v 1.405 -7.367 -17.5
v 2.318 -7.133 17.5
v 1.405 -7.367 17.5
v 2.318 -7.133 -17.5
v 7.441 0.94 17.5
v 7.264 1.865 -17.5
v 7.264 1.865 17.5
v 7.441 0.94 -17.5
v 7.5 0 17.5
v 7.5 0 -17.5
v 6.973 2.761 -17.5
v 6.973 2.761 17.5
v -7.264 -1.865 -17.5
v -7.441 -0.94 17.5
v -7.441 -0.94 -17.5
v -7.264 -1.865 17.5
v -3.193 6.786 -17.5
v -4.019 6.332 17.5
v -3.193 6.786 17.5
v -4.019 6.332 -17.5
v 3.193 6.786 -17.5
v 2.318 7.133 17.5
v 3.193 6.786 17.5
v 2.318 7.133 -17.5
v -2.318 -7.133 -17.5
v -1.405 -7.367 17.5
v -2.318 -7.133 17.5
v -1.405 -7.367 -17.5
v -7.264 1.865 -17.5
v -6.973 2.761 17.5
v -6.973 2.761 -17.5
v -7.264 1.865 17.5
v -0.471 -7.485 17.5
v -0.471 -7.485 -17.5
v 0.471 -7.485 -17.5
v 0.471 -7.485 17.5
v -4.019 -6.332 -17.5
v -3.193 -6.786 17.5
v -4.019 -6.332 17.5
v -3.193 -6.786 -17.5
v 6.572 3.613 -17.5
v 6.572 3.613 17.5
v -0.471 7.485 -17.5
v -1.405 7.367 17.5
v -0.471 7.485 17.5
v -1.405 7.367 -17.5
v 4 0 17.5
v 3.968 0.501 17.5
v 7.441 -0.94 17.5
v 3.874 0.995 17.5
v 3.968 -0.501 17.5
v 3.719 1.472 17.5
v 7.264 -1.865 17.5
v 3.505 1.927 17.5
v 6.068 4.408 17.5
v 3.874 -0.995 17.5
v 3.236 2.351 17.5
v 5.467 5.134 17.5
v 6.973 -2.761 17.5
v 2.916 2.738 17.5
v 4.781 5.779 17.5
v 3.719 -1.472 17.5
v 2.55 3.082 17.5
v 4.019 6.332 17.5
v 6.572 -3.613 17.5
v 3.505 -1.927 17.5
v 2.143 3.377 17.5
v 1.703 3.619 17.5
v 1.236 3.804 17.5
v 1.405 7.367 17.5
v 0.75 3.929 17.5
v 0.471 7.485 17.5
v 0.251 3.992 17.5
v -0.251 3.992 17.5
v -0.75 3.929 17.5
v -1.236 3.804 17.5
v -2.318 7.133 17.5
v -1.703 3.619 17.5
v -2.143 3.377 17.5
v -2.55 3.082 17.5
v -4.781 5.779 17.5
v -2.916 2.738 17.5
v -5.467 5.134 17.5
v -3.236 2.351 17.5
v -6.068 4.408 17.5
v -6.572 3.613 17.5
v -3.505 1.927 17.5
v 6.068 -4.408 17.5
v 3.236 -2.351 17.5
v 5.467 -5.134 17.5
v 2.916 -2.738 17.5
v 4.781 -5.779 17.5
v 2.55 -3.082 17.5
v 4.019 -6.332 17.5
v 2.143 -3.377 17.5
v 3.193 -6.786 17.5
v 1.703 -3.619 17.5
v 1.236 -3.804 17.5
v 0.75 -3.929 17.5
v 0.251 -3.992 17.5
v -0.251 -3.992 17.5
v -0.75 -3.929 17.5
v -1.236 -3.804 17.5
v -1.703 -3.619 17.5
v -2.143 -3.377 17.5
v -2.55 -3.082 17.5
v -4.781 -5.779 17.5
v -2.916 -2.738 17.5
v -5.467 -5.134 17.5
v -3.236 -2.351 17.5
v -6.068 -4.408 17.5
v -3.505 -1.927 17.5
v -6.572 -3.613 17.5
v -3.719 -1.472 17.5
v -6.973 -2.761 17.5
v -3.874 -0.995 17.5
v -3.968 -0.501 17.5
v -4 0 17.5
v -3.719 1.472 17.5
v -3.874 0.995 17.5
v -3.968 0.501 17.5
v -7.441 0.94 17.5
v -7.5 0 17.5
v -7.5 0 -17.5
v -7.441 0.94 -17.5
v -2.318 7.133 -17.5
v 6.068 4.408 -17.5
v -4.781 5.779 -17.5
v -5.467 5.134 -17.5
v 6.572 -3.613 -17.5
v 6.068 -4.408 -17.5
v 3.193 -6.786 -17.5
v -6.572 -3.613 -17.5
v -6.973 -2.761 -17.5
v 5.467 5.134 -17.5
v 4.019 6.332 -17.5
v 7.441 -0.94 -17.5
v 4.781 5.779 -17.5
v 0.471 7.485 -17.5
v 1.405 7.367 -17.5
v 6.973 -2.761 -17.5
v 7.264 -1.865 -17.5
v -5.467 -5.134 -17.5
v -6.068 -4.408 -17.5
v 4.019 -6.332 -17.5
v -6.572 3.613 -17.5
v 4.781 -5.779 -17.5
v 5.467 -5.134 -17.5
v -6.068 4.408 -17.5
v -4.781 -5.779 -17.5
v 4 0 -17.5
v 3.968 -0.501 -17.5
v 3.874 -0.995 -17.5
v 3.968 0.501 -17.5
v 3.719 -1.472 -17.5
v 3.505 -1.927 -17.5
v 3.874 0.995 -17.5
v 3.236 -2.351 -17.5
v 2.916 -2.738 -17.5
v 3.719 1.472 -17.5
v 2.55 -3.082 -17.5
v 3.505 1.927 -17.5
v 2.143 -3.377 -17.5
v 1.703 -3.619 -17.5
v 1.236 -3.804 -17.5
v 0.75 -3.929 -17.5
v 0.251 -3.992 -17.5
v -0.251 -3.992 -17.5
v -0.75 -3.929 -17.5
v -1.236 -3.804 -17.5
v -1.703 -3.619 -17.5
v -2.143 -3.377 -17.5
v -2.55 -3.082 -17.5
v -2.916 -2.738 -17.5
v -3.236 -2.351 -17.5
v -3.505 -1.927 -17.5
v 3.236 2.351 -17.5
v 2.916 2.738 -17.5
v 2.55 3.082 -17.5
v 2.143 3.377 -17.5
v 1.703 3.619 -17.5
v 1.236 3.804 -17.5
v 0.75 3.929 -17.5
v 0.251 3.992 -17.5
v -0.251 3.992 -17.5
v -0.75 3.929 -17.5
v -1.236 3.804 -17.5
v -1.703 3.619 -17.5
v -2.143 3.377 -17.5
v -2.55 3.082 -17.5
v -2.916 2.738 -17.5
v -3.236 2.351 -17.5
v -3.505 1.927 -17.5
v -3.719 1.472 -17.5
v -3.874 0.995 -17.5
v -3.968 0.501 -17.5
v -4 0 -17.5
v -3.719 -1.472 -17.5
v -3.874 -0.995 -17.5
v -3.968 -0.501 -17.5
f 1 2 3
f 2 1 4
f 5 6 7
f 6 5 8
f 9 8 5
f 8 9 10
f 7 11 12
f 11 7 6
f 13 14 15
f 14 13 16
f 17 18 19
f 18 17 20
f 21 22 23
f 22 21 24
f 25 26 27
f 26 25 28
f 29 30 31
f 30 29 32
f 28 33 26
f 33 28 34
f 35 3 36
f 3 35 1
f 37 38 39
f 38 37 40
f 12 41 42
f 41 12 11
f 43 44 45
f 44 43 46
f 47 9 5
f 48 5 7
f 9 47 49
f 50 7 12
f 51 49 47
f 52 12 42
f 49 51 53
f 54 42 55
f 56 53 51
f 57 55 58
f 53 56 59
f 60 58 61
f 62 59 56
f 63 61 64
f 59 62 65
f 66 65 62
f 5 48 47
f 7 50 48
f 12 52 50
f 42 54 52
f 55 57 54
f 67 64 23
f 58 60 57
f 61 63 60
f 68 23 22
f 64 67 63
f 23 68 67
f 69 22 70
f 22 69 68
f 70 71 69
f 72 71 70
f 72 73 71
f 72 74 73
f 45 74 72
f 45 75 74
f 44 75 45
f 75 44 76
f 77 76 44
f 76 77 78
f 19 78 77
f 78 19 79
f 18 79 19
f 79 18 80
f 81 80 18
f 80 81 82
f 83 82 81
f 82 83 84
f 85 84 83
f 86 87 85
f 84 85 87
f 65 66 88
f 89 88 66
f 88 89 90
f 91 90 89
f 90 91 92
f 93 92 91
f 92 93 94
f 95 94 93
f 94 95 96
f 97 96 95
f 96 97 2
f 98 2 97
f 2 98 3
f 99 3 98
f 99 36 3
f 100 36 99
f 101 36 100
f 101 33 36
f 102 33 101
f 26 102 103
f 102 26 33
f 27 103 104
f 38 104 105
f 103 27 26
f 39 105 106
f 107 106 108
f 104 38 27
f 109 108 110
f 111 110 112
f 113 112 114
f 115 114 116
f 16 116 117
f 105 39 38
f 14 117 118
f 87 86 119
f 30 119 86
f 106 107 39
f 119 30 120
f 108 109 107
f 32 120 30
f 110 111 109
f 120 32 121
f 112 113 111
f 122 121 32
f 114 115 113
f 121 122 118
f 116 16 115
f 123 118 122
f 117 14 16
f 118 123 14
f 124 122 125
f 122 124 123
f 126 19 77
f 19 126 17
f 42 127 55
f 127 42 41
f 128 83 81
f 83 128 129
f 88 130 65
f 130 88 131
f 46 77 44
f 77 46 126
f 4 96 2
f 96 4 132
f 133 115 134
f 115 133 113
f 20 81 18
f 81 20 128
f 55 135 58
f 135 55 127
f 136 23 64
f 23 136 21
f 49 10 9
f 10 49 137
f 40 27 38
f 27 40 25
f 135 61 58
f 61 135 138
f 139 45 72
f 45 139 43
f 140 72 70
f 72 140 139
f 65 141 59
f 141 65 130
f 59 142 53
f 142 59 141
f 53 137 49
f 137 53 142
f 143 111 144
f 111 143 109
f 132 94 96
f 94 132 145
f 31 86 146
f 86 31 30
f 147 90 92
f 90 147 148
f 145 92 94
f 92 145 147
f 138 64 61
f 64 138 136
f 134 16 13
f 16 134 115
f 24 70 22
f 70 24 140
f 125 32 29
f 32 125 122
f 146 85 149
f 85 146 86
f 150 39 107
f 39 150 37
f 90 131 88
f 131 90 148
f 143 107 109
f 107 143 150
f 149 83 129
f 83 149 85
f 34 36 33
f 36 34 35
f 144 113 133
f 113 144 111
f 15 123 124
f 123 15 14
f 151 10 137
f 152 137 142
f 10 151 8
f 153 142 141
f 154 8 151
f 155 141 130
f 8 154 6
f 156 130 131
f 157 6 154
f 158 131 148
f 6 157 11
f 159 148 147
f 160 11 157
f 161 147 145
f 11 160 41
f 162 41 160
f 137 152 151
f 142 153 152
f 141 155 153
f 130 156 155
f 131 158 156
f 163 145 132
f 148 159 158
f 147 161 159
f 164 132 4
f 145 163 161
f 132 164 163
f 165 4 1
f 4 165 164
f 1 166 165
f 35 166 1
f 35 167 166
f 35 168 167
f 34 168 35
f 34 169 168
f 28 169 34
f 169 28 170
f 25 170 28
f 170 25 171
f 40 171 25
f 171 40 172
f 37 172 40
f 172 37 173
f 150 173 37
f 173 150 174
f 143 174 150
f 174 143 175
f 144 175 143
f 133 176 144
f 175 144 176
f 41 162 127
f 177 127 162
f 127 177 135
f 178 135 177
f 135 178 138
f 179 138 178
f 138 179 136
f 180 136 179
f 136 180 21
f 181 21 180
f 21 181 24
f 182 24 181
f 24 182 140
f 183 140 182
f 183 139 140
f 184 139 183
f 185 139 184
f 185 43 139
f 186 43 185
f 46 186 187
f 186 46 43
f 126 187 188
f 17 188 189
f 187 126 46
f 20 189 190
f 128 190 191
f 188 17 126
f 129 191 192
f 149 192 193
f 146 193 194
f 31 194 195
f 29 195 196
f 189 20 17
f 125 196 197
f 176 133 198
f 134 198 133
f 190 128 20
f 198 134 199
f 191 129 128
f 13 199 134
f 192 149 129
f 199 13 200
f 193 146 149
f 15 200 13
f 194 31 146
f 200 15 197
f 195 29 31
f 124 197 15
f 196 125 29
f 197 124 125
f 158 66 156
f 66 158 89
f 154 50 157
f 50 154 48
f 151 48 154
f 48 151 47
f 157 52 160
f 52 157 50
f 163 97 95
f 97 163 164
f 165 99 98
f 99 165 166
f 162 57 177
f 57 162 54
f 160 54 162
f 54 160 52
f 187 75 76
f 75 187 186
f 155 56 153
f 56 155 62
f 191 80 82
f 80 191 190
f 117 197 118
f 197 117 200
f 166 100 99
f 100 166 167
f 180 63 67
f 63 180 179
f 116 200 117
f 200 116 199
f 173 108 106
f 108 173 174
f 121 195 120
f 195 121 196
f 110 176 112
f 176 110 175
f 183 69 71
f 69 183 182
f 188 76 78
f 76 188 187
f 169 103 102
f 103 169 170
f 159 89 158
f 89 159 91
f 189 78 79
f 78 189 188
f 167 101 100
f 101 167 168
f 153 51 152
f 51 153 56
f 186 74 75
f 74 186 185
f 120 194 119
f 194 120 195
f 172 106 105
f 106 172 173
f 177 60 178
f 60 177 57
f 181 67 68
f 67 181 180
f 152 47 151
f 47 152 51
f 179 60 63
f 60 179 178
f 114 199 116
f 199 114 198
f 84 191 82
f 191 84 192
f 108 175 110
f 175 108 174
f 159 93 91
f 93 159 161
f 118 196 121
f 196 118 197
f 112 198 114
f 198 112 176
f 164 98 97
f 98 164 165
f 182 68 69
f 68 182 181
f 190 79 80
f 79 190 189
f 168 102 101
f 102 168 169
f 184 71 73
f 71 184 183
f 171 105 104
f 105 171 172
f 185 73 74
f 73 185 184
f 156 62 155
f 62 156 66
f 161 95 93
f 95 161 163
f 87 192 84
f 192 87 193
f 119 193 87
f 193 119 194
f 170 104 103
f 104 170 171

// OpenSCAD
$fn = 50;


difference() {
	union() {
		translate(v = [0, 0, -17.5000000000]) {
			cylinder(h = 35, r = 7.5000000000);
		}
	}
	union() {
		translate(v = [0, 0, -100.0000000000]) {
			cylinder(h = 200, r = 4.0000000000);
		}
	}
}
